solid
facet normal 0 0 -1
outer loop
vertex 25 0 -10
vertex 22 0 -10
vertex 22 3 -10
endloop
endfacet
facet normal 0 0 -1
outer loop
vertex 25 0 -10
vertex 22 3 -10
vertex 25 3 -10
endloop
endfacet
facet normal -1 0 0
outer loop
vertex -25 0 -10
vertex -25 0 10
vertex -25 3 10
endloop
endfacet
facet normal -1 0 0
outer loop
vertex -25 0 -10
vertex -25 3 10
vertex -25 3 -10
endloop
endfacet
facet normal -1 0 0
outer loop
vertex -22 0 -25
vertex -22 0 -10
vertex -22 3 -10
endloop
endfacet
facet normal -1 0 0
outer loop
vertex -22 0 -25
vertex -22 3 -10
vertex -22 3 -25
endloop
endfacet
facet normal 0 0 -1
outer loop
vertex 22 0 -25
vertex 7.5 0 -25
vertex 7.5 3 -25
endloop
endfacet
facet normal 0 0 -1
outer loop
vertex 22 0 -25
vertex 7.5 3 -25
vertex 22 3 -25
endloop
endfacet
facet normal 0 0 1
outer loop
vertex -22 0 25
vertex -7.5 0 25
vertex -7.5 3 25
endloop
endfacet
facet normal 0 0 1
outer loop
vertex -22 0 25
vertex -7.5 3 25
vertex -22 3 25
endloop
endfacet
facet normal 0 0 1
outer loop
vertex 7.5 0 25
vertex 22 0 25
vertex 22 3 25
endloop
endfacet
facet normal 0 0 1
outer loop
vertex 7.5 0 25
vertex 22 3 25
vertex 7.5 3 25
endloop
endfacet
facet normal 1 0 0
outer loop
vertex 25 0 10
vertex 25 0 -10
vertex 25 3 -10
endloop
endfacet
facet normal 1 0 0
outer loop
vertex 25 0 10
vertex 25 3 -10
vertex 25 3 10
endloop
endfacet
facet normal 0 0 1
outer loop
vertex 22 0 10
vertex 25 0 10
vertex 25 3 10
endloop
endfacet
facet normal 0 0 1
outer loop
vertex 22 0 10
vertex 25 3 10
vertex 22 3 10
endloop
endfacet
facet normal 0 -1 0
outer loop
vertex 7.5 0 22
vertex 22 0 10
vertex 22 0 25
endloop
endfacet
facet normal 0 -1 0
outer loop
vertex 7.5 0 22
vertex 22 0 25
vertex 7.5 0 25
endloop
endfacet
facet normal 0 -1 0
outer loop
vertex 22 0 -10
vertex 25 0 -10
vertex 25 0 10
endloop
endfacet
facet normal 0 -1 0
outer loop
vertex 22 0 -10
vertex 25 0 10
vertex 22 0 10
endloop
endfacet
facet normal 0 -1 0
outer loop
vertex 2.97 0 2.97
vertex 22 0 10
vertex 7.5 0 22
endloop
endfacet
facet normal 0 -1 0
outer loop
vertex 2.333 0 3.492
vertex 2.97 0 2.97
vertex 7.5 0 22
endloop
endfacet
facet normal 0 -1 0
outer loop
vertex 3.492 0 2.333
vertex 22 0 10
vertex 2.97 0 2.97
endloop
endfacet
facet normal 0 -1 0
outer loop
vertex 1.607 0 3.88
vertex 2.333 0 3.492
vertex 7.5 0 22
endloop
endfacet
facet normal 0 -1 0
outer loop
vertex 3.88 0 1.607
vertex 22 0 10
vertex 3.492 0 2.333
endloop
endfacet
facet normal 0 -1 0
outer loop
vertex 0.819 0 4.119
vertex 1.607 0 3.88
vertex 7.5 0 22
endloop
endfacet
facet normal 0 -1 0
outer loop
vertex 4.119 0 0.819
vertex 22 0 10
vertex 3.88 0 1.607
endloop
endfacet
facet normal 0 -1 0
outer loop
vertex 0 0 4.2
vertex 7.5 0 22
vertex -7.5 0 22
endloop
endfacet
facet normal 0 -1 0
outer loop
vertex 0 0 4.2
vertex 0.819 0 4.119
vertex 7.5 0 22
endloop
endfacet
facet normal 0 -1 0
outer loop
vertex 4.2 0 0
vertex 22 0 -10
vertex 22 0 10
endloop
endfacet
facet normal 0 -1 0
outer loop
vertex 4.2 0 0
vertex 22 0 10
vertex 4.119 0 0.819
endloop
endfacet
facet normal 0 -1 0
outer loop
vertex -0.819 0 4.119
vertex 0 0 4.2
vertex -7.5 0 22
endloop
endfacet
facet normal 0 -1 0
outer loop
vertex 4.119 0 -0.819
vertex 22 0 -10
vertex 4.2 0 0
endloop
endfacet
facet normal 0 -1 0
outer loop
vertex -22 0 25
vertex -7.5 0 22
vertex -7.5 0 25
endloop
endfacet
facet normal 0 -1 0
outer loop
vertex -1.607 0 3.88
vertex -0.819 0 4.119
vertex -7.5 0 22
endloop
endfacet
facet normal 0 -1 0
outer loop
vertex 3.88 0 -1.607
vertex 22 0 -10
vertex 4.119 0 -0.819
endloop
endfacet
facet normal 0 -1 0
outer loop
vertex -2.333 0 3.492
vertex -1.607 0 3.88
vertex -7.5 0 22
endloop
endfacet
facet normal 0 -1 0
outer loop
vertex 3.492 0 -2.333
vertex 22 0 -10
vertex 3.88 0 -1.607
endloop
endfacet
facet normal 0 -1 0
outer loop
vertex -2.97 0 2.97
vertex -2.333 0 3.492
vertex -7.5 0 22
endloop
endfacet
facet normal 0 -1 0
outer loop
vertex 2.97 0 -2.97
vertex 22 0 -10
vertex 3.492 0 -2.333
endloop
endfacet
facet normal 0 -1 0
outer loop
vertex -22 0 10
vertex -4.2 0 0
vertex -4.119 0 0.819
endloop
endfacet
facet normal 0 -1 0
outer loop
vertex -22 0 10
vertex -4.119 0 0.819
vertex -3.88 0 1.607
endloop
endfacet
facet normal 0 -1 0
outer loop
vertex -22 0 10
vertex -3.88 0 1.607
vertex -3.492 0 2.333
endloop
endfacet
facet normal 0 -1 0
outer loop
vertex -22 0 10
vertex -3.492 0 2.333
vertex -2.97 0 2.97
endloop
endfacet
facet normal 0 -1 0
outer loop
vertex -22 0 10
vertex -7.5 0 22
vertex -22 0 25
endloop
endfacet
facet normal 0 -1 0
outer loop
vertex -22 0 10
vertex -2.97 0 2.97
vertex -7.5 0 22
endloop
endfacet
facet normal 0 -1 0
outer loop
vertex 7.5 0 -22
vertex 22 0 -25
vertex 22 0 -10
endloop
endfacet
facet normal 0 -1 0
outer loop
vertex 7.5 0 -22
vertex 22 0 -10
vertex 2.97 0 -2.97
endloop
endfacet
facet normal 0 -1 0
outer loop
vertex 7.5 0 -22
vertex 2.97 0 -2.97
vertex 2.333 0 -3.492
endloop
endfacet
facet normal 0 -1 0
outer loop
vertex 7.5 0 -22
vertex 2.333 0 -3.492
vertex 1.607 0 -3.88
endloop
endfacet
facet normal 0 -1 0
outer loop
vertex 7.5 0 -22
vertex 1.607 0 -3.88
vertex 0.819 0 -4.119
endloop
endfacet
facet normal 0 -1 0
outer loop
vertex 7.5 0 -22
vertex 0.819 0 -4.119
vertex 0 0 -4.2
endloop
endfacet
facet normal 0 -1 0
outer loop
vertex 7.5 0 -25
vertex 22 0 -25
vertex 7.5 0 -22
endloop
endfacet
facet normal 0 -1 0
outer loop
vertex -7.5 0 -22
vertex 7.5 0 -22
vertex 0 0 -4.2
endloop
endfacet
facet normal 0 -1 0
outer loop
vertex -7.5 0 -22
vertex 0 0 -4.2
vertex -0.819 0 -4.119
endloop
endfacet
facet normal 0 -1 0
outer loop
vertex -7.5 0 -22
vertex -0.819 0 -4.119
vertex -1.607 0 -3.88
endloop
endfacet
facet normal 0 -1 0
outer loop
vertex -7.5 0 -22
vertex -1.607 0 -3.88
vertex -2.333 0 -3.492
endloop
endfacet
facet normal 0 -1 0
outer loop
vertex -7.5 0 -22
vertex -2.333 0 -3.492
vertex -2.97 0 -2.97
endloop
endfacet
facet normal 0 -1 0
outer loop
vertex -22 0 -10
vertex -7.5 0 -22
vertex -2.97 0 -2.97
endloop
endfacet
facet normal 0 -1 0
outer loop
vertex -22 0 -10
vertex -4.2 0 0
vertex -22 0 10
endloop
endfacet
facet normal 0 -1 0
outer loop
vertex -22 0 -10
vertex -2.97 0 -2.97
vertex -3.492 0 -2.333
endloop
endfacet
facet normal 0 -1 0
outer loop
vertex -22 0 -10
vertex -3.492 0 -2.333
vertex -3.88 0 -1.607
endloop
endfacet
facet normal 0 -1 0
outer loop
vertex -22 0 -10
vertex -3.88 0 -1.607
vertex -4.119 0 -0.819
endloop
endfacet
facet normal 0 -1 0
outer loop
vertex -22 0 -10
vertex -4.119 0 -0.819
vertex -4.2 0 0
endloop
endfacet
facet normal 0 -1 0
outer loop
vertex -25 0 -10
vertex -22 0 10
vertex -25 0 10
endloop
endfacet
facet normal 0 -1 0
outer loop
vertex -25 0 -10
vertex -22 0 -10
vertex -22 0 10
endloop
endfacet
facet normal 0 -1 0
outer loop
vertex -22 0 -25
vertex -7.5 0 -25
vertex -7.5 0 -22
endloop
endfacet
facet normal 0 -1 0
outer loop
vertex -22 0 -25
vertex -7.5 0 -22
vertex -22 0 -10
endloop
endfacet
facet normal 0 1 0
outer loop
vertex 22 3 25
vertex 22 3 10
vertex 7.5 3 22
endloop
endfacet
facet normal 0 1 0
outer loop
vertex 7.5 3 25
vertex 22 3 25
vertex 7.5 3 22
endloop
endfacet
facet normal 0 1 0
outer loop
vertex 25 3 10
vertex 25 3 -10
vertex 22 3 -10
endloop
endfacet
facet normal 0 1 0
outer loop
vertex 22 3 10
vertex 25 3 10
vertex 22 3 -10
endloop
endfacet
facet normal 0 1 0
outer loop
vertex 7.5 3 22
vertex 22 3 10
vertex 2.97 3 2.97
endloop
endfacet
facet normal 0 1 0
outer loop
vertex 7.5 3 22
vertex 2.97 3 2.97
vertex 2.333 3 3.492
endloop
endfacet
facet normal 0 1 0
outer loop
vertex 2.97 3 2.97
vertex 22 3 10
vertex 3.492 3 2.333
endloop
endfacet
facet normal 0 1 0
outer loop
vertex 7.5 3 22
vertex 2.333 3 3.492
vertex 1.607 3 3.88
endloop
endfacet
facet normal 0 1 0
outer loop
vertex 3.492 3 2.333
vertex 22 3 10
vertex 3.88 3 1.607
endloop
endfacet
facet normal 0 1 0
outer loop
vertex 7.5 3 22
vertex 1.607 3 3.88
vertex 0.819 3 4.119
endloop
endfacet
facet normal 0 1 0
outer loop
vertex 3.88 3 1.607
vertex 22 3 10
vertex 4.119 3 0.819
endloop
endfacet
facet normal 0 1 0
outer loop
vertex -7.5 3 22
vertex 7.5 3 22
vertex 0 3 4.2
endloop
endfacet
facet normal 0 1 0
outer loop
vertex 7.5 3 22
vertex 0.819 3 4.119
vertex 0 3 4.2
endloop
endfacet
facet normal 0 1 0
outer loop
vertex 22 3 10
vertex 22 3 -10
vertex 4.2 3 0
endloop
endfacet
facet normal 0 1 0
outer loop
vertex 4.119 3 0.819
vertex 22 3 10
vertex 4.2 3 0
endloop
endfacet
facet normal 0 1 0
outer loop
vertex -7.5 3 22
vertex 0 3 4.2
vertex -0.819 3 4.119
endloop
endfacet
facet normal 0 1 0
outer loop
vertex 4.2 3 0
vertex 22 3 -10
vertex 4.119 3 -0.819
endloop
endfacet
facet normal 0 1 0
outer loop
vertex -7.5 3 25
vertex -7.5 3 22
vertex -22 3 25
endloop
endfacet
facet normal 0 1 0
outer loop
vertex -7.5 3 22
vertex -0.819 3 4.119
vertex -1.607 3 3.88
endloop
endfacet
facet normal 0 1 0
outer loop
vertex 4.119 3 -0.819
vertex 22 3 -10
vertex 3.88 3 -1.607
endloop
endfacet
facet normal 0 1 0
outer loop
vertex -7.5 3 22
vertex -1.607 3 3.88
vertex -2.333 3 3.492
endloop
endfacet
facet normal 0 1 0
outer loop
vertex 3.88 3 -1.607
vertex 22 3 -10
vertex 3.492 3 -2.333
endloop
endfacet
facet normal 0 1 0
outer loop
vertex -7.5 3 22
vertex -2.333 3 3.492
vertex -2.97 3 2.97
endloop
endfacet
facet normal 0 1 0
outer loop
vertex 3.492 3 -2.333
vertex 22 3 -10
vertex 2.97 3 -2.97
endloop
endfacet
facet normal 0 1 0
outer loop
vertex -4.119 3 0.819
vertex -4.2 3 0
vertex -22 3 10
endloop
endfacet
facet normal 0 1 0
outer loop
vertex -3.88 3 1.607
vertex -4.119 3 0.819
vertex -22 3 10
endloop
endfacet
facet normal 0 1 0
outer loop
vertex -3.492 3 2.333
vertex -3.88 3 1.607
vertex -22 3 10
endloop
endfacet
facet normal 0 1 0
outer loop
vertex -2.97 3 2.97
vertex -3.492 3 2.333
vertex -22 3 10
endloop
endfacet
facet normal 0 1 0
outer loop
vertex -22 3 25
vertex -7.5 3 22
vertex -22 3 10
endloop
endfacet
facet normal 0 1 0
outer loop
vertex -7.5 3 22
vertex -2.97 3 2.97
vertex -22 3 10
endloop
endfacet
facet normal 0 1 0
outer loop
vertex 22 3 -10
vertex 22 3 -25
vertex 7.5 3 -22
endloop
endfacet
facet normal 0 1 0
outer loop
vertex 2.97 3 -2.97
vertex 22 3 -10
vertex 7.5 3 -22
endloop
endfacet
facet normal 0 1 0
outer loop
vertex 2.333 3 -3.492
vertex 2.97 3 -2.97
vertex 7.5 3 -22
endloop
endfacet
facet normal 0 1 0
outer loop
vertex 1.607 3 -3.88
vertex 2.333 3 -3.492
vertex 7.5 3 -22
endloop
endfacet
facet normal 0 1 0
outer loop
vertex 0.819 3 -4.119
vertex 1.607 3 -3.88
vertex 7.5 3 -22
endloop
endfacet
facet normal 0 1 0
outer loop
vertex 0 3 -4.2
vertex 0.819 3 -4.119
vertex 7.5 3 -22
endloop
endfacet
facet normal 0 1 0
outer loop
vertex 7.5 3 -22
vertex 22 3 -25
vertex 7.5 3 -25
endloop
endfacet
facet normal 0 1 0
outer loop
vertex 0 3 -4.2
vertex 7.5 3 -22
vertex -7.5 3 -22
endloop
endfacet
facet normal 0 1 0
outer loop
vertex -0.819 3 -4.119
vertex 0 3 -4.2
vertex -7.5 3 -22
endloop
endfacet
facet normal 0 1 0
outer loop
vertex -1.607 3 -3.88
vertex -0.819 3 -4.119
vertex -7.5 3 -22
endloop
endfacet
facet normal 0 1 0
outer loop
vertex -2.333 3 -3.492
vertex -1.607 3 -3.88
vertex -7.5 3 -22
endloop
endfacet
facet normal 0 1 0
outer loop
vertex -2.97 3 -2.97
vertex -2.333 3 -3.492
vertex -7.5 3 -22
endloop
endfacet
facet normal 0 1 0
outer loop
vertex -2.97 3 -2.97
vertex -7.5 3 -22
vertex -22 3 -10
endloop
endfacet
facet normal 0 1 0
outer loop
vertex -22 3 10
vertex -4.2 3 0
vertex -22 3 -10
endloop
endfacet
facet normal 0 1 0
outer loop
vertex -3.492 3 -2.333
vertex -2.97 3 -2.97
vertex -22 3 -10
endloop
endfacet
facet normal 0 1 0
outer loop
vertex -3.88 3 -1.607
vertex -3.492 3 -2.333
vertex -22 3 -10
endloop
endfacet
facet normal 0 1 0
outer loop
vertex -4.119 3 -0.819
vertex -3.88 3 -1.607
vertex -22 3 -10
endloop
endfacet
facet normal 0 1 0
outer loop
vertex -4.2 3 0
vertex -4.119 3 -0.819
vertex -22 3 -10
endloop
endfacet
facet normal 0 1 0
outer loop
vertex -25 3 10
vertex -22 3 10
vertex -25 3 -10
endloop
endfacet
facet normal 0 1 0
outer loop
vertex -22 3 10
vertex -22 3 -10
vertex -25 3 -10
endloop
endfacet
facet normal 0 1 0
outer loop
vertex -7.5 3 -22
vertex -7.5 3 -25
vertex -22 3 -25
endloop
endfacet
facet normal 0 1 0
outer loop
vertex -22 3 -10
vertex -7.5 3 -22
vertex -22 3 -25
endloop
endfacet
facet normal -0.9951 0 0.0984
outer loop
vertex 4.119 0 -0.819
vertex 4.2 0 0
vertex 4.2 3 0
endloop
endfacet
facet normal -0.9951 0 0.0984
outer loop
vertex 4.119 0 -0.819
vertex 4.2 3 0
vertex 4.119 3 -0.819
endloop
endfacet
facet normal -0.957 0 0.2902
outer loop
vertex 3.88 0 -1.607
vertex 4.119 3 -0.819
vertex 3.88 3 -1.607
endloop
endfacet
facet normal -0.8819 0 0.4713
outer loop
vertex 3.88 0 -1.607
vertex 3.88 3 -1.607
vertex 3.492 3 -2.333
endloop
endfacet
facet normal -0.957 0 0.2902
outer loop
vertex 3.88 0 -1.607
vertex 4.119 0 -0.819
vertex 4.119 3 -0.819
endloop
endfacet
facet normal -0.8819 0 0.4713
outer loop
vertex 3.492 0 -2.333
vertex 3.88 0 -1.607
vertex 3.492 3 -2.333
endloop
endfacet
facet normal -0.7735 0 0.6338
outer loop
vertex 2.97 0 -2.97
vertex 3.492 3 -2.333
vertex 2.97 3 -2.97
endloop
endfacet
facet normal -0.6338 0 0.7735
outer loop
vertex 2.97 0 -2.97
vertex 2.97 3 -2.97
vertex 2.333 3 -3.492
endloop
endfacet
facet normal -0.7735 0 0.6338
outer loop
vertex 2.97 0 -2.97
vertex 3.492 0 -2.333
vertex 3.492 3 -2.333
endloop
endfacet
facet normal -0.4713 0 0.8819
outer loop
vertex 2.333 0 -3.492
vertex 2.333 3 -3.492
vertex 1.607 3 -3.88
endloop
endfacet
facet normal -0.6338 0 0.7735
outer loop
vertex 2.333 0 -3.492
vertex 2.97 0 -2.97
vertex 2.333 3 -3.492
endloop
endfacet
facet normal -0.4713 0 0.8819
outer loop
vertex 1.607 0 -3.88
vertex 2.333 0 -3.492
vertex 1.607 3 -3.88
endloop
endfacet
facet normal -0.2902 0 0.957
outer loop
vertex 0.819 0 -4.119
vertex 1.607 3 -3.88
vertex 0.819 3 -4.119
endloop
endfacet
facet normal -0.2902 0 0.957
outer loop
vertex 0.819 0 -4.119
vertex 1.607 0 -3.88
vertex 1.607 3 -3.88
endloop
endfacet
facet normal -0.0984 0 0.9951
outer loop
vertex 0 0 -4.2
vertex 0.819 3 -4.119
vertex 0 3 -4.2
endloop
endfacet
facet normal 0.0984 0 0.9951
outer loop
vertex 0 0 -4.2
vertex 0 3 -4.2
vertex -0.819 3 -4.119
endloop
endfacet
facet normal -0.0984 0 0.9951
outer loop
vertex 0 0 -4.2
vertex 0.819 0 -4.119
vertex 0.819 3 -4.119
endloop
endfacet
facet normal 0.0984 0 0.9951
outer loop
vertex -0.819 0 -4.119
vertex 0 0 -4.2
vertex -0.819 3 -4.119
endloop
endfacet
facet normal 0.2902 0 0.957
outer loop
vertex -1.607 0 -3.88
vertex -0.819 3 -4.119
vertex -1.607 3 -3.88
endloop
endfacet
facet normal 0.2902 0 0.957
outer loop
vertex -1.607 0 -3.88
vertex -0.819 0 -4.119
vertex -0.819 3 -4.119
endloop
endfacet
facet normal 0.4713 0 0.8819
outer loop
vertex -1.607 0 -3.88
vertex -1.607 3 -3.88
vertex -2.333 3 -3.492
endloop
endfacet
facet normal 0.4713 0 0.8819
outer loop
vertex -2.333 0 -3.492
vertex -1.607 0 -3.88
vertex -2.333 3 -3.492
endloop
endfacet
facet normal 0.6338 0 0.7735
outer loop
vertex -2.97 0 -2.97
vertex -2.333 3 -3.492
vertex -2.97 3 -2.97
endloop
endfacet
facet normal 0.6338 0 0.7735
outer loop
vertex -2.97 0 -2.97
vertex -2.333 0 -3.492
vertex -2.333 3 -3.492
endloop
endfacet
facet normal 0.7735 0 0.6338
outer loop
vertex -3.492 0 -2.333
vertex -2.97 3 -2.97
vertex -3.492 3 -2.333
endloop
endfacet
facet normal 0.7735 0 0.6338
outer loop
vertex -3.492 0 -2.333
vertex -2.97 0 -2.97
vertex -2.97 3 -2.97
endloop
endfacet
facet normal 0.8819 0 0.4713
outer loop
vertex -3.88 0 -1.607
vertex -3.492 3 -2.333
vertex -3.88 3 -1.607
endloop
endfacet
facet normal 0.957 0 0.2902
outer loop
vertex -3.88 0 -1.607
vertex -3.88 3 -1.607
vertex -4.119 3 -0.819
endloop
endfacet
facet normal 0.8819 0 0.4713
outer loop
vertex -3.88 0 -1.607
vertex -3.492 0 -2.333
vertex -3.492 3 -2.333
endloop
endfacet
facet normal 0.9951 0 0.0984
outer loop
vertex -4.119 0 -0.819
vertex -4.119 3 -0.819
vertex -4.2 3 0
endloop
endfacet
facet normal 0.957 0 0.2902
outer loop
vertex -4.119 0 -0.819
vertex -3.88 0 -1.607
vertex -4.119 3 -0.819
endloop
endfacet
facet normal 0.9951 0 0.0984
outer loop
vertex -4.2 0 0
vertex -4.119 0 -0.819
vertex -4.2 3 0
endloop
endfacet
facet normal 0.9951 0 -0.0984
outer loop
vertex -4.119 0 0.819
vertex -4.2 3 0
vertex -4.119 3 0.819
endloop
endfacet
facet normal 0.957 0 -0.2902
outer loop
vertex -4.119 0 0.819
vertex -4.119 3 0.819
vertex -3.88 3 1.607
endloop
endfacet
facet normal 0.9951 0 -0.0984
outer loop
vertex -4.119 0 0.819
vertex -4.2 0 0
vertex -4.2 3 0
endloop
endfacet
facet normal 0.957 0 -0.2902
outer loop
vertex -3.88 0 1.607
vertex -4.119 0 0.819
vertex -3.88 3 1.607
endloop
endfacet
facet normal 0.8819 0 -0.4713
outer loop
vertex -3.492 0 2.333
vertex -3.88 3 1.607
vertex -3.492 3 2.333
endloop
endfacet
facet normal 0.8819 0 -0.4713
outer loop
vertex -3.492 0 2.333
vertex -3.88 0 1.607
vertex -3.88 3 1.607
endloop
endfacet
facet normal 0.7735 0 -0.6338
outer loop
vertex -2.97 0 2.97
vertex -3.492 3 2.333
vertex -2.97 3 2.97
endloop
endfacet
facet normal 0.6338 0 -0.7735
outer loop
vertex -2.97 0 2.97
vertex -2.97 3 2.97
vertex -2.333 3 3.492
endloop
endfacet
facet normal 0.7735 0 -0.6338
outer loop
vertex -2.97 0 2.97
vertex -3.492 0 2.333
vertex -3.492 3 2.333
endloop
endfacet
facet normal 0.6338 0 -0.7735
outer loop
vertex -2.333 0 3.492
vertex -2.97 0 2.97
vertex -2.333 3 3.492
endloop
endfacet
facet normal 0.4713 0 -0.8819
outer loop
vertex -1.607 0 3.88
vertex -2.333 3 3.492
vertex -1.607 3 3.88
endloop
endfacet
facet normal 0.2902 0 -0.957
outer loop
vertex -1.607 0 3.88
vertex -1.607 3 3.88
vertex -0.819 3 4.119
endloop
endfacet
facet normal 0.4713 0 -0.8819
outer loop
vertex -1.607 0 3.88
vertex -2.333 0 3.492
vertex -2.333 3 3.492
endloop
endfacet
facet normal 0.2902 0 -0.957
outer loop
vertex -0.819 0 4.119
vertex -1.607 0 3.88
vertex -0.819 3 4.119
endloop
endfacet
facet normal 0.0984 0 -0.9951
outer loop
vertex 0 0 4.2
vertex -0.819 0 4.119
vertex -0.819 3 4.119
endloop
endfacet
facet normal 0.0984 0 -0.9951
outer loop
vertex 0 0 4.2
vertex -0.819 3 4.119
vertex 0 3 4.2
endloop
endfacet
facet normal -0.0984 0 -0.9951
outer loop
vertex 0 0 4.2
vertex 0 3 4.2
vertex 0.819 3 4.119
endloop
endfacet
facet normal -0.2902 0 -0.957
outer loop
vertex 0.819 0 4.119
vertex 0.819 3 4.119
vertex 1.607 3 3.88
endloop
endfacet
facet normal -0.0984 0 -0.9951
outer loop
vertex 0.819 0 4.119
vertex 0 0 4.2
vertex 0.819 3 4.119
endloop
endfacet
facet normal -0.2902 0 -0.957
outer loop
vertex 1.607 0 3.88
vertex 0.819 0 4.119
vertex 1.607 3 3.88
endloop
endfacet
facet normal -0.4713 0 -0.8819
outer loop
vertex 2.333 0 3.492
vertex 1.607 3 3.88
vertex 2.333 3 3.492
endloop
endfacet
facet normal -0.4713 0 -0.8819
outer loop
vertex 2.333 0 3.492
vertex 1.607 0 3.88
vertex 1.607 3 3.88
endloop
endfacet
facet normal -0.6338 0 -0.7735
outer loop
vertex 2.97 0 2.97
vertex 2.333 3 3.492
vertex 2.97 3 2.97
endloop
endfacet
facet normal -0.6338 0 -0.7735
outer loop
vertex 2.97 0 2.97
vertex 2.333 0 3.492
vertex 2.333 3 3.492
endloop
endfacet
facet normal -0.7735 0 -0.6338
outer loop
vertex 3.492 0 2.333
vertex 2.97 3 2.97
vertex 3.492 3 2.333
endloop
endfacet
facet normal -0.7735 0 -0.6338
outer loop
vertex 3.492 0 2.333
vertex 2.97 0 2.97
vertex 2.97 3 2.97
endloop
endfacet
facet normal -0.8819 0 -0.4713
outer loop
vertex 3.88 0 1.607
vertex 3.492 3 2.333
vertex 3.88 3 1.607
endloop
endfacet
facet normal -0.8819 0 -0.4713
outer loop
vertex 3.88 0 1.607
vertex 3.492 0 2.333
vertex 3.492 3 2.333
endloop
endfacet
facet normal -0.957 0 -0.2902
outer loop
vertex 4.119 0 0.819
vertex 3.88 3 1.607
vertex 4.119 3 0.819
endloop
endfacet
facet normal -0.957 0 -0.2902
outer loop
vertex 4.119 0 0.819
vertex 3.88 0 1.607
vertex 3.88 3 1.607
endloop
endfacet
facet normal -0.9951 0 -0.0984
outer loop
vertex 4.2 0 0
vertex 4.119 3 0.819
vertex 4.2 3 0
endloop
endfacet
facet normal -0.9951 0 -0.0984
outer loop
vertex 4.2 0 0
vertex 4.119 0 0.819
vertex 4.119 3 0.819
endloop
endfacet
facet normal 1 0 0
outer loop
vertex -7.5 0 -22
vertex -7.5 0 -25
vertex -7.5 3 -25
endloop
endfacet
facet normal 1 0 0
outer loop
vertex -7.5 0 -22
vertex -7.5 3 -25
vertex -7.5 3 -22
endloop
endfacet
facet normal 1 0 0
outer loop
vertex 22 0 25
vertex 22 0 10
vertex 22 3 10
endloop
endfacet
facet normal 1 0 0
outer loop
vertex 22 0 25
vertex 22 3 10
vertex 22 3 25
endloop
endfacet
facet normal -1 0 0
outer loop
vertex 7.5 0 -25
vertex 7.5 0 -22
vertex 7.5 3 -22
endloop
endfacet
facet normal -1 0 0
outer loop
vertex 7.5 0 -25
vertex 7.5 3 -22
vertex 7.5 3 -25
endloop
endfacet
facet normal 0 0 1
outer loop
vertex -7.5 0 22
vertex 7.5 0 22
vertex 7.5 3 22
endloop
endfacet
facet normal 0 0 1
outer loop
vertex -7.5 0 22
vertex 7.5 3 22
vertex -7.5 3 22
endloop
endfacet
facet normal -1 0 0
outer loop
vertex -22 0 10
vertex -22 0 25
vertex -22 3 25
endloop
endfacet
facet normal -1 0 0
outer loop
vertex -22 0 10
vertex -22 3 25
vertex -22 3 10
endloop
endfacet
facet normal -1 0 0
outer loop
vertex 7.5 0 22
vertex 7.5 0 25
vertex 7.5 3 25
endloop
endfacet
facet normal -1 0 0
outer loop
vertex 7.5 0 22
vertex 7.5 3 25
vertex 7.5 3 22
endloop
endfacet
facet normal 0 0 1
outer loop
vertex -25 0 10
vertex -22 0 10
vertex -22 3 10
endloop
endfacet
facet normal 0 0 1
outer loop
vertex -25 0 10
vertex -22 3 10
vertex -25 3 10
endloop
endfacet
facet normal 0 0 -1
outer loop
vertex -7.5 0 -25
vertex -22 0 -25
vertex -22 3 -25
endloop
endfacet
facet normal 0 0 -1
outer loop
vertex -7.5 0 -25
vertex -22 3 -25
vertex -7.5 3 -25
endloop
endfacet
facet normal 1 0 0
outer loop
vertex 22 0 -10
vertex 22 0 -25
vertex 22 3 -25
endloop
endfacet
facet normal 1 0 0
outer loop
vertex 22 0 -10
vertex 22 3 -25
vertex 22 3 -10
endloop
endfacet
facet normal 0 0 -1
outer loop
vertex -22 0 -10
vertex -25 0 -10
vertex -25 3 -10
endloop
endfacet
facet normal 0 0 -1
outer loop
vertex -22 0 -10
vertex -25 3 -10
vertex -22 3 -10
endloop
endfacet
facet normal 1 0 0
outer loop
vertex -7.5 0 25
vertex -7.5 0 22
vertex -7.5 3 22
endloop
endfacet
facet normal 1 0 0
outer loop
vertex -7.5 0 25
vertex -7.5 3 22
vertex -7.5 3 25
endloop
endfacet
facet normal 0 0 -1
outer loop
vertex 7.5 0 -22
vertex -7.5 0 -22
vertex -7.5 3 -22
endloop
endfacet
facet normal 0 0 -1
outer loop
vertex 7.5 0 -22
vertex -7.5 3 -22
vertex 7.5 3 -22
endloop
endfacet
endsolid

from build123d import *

# Parameters (mm, degrees)
SKETCH_1_R      = 4.2
EXTRUDE_1_DEPTH = 3


with BuildPart() as part:
    # 草图1 → 凸台-拉伸1 (new body)
    with BuildSketch(Plane(origin=(0, 0, 0), x_dir=(1, 0, 0), z_dir=(0, 1, 0))):
        Polygon((22, 25), (22, 10), (25, 10), (25, -10), (22, -10), (22, -25), (7.5, -25), (7.5, -22), (-7.5, -22), (-7.5, -25), (-22, -25), (-22, -10), (-25, -10), (-25, 10), (-22, 10), (-22, 25), (-7.5, 25), (-7.5, 22), (7.5, 22), (7.5, 25), align=None)
        Circle(SKETCH_1_R, mode=Mode.SUBTRACT)
    extrude(amount=EXTRUDE_1_DEPTH)


solid = part.part
